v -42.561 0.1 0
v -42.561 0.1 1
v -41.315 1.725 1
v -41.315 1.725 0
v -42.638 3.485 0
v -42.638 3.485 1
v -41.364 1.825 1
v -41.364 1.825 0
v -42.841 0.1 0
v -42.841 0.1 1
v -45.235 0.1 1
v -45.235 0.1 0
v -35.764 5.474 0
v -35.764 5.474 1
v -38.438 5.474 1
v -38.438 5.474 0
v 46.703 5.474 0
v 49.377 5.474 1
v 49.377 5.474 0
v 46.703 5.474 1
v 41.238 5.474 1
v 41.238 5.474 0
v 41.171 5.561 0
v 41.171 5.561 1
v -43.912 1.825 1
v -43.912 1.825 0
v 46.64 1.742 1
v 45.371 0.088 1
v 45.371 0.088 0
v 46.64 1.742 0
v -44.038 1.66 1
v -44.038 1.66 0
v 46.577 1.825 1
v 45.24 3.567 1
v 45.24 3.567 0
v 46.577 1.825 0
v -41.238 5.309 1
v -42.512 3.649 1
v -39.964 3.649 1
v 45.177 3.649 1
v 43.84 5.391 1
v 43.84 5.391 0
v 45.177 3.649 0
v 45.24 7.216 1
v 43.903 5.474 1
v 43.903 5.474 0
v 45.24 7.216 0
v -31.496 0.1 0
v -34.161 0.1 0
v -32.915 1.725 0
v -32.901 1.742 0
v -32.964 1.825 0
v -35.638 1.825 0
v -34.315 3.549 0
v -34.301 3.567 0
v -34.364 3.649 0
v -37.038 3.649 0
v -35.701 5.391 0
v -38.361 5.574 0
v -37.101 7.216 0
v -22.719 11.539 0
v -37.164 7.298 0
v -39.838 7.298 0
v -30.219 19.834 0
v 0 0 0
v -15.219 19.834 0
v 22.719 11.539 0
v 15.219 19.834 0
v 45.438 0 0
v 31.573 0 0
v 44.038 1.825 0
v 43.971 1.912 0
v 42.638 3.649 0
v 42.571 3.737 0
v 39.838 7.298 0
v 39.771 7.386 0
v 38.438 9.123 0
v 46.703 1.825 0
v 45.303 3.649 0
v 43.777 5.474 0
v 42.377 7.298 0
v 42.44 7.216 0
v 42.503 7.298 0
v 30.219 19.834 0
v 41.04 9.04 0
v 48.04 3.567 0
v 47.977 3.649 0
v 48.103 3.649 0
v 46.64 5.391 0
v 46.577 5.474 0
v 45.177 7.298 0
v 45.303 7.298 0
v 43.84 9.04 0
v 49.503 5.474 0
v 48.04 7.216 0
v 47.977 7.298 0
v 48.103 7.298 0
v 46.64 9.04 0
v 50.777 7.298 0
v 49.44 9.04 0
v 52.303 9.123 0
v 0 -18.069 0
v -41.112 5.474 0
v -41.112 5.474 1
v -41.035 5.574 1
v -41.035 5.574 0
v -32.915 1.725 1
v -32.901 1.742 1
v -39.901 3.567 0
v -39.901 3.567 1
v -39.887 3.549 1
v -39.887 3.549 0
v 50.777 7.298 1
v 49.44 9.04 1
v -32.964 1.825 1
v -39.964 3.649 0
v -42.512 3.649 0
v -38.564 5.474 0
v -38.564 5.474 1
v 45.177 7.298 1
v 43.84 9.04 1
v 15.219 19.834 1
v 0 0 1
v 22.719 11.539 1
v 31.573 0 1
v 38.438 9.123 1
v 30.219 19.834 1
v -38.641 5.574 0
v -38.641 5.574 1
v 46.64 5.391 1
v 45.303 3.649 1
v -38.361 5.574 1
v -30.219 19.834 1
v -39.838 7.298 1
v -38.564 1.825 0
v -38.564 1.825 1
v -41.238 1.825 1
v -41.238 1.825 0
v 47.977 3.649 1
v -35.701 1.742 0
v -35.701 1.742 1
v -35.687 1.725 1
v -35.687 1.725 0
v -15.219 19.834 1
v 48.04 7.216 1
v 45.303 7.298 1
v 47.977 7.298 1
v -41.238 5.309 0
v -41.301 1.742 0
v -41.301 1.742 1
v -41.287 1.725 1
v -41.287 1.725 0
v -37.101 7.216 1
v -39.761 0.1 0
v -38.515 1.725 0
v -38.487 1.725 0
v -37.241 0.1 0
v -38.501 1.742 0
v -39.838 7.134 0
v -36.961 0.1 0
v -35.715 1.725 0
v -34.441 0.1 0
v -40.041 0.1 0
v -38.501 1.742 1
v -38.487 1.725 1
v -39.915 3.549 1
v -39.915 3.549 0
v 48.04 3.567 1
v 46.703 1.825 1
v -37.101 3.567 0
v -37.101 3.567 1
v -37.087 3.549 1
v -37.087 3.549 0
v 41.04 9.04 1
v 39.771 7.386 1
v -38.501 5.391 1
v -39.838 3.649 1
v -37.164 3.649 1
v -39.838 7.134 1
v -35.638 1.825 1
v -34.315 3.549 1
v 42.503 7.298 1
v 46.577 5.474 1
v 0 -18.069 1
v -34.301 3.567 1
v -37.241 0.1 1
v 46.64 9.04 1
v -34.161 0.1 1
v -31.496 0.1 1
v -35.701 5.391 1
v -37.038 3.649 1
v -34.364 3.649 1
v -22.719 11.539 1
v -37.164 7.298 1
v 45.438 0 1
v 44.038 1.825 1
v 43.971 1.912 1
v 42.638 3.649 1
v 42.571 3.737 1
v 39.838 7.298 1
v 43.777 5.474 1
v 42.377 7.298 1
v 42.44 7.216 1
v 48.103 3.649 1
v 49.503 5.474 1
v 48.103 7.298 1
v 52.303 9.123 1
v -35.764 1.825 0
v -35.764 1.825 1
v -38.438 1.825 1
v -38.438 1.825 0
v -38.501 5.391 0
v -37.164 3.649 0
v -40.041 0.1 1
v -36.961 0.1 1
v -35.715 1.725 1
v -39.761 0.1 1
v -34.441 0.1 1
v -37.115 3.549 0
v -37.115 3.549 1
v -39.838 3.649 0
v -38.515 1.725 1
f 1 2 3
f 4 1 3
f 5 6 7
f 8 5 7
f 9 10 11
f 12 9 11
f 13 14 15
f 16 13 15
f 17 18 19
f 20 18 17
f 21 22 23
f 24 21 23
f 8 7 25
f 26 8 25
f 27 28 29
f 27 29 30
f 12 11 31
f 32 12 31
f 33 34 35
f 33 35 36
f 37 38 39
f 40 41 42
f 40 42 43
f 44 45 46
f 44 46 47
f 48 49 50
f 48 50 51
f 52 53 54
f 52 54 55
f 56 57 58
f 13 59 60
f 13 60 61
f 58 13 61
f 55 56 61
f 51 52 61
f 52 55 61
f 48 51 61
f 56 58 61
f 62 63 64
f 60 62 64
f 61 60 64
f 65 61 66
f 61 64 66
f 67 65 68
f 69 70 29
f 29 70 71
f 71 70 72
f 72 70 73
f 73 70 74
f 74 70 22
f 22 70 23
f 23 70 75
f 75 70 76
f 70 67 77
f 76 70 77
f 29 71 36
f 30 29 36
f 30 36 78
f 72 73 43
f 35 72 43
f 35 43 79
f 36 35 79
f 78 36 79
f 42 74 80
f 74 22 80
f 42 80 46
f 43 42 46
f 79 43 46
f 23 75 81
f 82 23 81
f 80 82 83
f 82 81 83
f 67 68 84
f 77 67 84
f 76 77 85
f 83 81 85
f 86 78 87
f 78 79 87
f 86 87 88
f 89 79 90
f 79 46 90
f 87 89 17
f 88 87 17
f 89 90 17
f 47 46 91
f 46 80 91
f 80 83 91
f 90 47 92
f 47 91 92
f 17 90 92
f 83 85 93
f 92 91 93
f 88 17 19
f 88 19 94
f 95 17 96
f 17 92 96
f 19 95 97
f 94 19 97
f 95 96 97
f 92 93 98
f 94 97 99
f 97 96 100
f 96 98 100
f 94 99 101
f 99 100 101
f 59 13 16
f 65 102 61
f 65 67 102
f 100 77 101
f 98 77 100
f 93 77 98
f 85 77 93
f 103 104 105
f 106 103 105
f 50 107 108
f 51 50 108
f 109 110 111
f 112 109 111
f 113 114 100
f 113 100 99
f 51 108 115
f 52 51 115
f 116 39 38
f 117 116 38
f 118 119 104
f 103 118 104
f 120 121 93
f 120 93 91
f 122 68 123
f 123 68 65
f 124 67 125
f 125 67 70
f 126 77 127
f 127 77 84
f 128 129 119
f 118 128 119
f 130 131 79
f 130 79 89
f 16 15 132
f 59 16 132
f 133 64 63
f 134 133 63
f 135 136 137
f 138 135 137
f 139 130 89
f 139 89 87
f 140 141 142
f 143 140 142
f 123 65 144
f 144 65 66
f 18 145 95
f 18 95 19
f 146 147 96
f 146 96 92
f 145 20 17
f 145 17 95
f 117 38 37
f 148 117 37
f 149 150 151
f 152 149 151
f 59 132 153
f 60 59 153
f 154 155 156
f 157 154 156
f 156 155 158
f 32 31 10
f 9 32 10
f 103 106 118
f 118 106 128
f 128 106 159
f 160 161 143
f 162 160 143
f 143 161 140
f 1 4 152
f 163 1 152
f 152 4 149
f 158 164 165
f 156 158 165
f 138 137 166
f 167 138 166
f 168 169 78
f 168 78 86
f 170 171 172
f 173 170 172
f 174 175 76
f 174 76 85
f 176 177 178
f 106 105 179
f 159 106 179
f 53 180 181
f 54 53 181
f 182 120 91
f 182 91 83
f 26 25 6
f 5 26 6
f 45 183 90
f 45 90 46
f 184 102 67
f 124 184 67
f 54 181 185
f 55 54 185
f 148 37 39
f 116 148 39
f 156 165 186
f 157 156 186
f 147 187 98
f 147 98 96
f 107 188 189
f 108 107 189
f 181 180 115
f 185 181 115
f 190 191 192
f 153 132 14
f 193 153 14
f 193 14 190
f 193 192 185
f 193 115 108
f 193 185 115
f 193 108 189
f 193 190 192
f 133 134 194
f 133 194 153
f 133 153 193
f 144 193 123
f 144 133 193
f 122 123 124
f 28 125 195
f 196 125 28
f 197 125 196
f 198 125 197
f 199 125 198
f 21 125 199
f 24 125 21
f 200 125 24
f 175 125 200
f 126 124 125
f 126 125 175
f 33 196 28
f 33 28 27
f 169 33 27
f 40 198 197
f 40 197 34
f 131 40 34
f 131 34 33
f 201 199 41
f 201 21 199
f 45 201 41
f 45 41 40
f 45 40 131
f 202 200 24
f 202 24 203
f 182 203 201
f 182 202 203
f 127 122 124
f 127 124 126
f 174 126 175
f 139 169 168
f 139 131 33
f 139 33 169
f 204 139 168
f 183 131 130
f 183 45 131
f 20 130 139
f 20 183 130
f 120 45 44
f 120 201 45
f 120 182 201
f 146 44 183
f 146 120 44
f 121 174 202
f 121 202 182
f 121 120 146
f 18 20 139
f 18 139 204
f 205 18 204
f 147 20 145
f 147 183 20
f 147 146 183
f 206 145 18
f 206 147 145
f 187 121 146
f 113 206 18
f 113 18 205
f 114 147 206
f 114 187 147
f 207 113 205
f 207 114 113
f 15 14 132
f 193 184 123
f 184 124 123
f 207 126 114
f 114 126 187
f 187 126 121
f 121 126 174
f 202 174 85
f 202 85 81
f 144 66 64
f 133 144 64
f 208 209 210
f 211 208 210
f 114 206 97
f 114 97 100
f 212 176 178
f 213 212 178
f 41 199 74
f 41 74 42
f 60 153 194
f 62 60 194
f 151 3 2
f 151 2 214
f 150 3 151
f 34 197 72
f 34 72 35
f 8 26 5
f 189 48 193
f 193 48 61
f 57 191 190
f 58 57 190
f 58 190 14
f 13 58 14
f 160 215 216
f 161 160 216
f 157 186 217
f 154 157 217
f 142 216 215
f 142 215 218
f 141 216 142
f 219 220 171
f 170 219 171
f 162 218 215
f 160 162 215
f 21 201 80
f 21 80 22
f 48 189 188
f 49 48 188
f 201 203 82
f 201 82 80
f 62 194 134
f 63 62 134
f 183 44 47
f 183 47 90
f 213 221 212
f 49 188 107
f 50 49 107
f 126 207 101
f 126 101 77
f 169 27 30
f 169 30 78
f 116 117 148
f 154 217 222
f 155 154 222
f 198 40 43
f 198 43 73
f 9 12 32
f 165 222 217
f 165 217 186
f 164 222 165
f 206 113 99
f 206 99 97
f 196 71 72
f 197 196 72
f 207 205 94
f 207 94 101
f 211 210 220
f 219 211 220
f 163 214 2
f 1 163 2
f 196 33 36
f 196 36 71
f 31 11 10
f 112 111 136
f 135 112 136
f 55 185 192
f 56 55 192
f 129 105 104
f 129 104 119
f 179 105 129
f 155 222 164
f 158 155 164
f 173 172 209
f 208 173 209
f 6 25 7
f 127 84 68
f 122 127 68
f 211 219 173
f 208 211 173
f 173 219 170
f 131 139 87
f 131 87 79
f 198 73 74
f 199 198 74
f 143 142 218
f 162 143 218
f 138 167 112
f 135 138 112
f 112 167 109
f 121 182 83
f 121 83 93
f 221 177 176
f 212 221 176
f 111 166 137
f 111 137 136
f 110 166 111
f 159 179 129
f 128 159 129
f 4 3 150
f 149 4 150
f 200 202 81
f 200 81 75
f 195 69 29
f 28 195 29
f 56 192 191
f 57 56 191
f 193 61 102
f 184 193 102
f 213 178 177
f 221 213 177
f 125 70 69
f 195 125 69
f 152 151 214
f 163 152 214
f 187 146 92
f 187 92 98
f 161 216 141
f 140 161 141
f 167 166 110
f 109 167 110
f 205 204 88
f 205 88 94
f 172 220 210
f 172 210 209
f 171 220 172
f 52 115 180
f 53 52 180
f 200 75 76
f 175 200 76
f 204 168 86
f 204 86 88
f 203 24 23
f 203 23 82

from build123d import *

# Parameters (mm, degrees)
F1_DEPTH = 1
F3_DEPTH = 25
F4_DEPTH = 1
F5_DEPTH = 25


with BuildPart() as f1:
    # F0 (on Top) → F1 (new body)
    with BuildSketch(Plane.XY):
        Polygon((15.2190357252, 19.8338335073), (0, 0), (-15.2190357252, 19.8338335073), (-30.2190357252, 19.8338335073), (-45.4380714504, 0), (-31.5728748963, 0), (-22.7190357252, 11.5385478548), (0, -18.0694759488), (22.7190357252, 11.5385478548), (31.5728748963, 0), (45.4380714504, 0), (30.2190357252, 19.8338335073), align=None)
    extrude(amount=F1_DEPTH)

    # F2 (on face) → F3 (cut)
    with BuildSketch(Plane.XY.offset(1)):
        Polygon((-38.5148041492, 1.724515522), (-41.1613387516, 1.724515522), (-39.9148041492, 0.1), (-39.7613387516, 0.1), align=None)
        Polygon((-41.112024209, 5.4735465659), (-41.1750478297, 5.3914125843), (-39.8380714504, 3.649031044), (-38.5010950711, 5.3914125843), (-38.5641186918, 5.4735465659), align=None)
        Polygon((-39.712024209, 7.2980620879), (-39.7750478297, 7.2159281063), (-38.5148041492, 5.5735465659), (-38.4380714504, 5.5735465659), (-38.3613387516, 5.5735465659), (-37.1010950711, 7.2159281063), (-37.1641186918, 7.2980620879), align=None)
        Polygon((-35.7641186918, 5.4735465659), (-38.4380714504, 5.4735465659), (-37.0380714504, 3.649031044), (-35.7010950711, 5.3914125843), align=None)
        Polygon((-41.3148041492, 1.724515522), (-43.9613387516, 1.724515522), (-42.7148041492, 0.1), (-42.5613387516, 0.1), align=None)
        Polygon((-39.9148041492, 3.549031044), (-42.5613387516, 3.549031044), (-41.2380714504, 1.824515522), align=None)
        Polygon((-37.1148041492, 3.549031044), (-39.7613387516, 3.549031044), (-38.4380714504, 1.824515522), align=None)
        Polygon((-35.7148041492, 1.724515522), (-38.3613387516, 1.724515522), (-37.1148041492, 0.1), (-36.9613387516, 0.1), align=None)
        Polygon((-34.3148041492, 3.549031044), (-36.9613387516, 3.549031044), (-35.6380714504, 1.824515522), align=None)
        Polygon((-34.1613387516, 0.1), (-32.9148041492, 1.724515522), (-35.5613387516, 1.724515522), (-34.3148041492, 0.1), align=None)
    extrude(amount=-F3_DEPTH, mode=Mode.SUBTRACT)

    # F2 (on face) → F4 (join)
    with BuildSketch(Plane.XY.offset(1)):
        Polygon((46.5772207631, 1.824515522), (44.0380714504, 1.824515522), (45.3706697275, 0.0878396355), (46.6402443838, 1.7423815404), align=None)
        Polygon((45.1772207631, 3.649031044), (42.6380714504, 3.649031044), (43.9706697275, 1.9123551575), (45.2402443838, 3.5668970624), align=None)
        Polygon((43.7772207631, 5.4735465659), (41.2380714504, 5.4735465659), (42.5706697275, 3.7368706795), (43.8402443838, 5.3914125843), align=None)
        Polygon((42.3772207631, 7.2980620879), (39.8380714504, 7.2980620879), (41.1706697275, 5.5613862014), (42.4402443838, 7.2159281063), align=None)
        Polygon((41.1032680045, 9.1225776099), (38.4380714504, 9.1225776099), (39.7706697275, 7.3859017234), (41.0402443838, 9.0404436283), align=None)
        Polygon((43.9032680045, 9.1225776099), (41.1032680045, 9.1225776099), (42.5032680045, 7.2980620879), (43.8402443838, 9.0404436283), align=None)
        Polygon((45.1772207631, 7.2980620879), (42.5032680045, 7.2980620879), (43.9032680045, 5.4735465659), (45.2402443838, 7.2159281063), align=None)
        Polygon((46.7032680045, 9.1225776099), (43.9032680045, 9.1225776099), (45.3032680045, 7.2980620879), (46.6402443838, 9.0404436283), align=None)
        Polygon((49.5032680045, 9.1225776099), (46.7032680045, 9.1225776099), (48.1032680045, 7.2980620879), (49.4402443838, 9.0404436283), align=None)
        Polygon((52.3032680045, 9.1225776099), (49.5032680045, 9.1225776099), (50.9032680045, 7.2980620879), align=None)
        Polygon((50.7772207631, 7.2980620879), (48.1032680045, 7.2980620879), (49.5032680045, 5.4735465659), (50.9032680045, 7.2980620879), align=None)
        Polygon((49.3772207631, 5.4735465659), (46.7032680045, 5.4735465659), (48.1032680045, 3.649031044), (49.5032680045, 5.4735465659), align=None)
        Polygon((47.9772207631, 7.2980620879), (45.3032680045, 7.2980620879), (46.7032680045, 5.4735465659), (48.0402443838, 7.2159281063), align=None)
        Polygon((46.5772207631, 5.4735465659), (43.9032680045, 5.4735465659), (45.3032680045, 3.649031044), (46.6402443838, 5.3914125843), align=None)
        Polygon((47.9772207631, 3.649031044), (45.3032680045, 3.649031044), (46.7032680045, 1.824515522), (48.0402443838, 3.5668970624), align=None)
        Polygon((46.7032680045, 1.824515522), (45.3032680045, 3.649031044), (45.2402443838, 3.5668970624), (46.5772207631, 1.824515522), align=None)
        Polygon((45.2402443838, 3.5668970624), (45.3032680045, 3.649031044), (45.1772207631, 3.649031044), align=None)
        Polygon((45.3032680045, 3.649031044), (43.9032680045, 5.4735465659), (43.8402443838, 5.3914125843), (45.1772207631, 3.649031044), align=None)
        Polygon((46.6402443838, 1.7423815404), (46.7032680045, 1.824515522), (46.5772207631, 1.824515522), align=None)
        Polygon((43.9032680045, 5.4735465659), (42.5032680045, 7.2980620879), (42.4402443838, 7.2159281063), (43.7772207631, 5.4735465659), align=None)
        Polygon((43.8402443838, 5.3914125843), (43.9032680045, 5.4735465659), (43.7772207631, 5.4735465659), align=None)
        Polygon((48.1032680045, 3.649031044), (46.7032680045, 5.4735465659), (46.6402443838, 5.3914125843), (47.9772207631, 3.649031044), align=None)
        Polygon((46.7032680045, 5.4735465659), (46.5772207631, 5.4735465659), (46.6402443838, 5.3914125843), align=None)
        Polygon((46.7032680045, 5.4735465659), (45.3032680045, 7.2980620879), (45.2402443838, 7.2159281063), (46.5772207631, 5.4735465659), align=None)
        Polygon((48.1032680045, 3.649031044), (47.9772207631, 3.649031044), (48.0402443838, 3.5668970624), align=None)
        Polygon((49.5032680045, 5.4735465659), (48.1032680045, 7.2980620879), (48.0402443838, 7.2159281063), (49.3772207631, 5.4735465659), align=None)
        Polygon((42.5032680045, 7.2980620879), (41.1032680045, 9.1225776099), (41.0402443838, 9.0404436283), (42.3772207631, 7.2980620879), align=None)
        Polygon((42.4402443838, 7.2159281063), (42.5032680045, 7.2980620879), (42.3772207631, 7.2980620879), align=None)
        Polygon((45.3032680045, 7.2980620879), (43.9032680045, 9.1225776099), (43.8402443838, 9.0404436283), (45.1772207631, 7.2980620879), align=None)
        Polygon((45.3032680045, 7.2980620879), (45.1772207631, 7.2980620879), (45.2402443838, 7.2159281063), align=None)
        Polygon((48.1032680045, 7.2980620879), (46.7032680045, 9.1225776099), (46.6402443838, 9.0404436283), (47.9772207631, 7.2980620879), align=None)
        Polygon((48.1032680045, 7.2980620879), (47.9772207631, 7.2980620879), (48.0402443838, 7.2159281063), align=None)
        Polygon((50.9032680045, 7.2980620879), (49.5032680045, 9.1225776099), (49.4402443838, 9.0404436283), (50.7772207631, 7.2980620879), align=None)
    extrude(amount=-F4_DEPTH)

    # F2 (on face) → F5 (cut)
    with BuildSketch(Plane.XY.offset(1)):
        Polygon((-44.0380714504, 1.6602475588), (-44.1010950711, 1.7423815404), (-45.4380714504, 0), (-42.7641186918, 0), (-42.8408513906, 0.1), (-45.2352915102, 0.1), align=None)
        Polygon((-43.9750478297, 1.7423815404), (-44.0380714504, 1.824515522), (-44.1010950711, 1.7423815404), (-44.0380714504, 1.6602475588), (-43.9887569078, 1.724515522), align=None)
        Polygon((-43.912024209, 1.824515522), (-44.0380714504, 1.824515522), (-43.9750478297, 1.7423815404), align=None)
        Polygon((-42.6380714504, 3.4847630808), (-42.7010950711, 3.5668970624), (-44.0380714504, 1.824515522), (-43.912024209, 1.824515522), align=None)
        Polygon((-42.8408513906, 0.1), (-42.7641186918, 0), (-42.6380714504, 0), (-42.7148041492, 0.1), align=None)
        Polygon((-42.5613387516, 0.1), (-42.7148041492, 0.1), (-42.6380714504, 0), align=None)
        Polygon((-42.5613387516, 0.1), (-42.6380714504, 0), (-39.9641186918, 0), (-40.0408513906, 0.1), align=None)
        Polygon((-39.8380714504, 0), (-39.9148041492, 0.1), (-40.0408513906, 0.1), (-39.9641186918, 0), align=None)
        Polygon((-39.7613387516, 0.1), (-39.9148041492, 0.1), (-39.8380714504, 0), align=None)
        Polygon((-37.1641186918, 0), (-37.2408513906, 0.1), (-39.7613387516, 0.1), (-39.8380714504, 0), align=None)
        Polygon((-42.5750478297, 3.5668970624), (-42.6380714504, 3.649031044), (-42.7010950711, 3.5668970624), (-42.6380714504, 3.4847630808), (-42.5887569078, 3.549031044), align=None)
        Polygon((-42.512024209, 3.649031044), (-42.6380714504, 3.649031044), (-42.5750478297, 3.5668970624), align=None)
        Polygon((-41.2380714504, 5.3092786028), (-41.3010950711, 5.3914125843), (-42.6380714504, 3.649031044), (-42.512024209, 3.649031044), align=None)
        Polygon((-41.1750478297, 5.3914125843), (-41.2380714504, 5.4735465659), (-41.3010950711, 5.3914125843), (-41.2380714504, 5.3092786028), align=None)
        Polygon((-41.112024209, 5.4735465659), (-41.2380714504, 5.4735465659), (-41.1750478297, 5.3914125843), align=None)
        Polygon((-41.0352915102, 5.5735465659), (-41.1613387516, 5.5735465659), (-41.2380714504, 5.4735465659), (-41.112024209, 5.4735465659), align=None)
        Polygon((-39.8380714504, 7.1337941247), (-39.9010950711, 7.2159281063), (-41.1613387516, 5.5735465659), (-41.0352915102, 5.5735465659), align=None)
        Polygon((-39.7750478297, 7.2159281063), (-39.8380714504, 7.2980620879), (-39.9010950711, 7.2159281063), (-39.8380714504, 7.1337941247), align=None)
        Polygon((-39.712024209, 7.2980620879), (-39.8380714504, 7.2980620879), (-39.7750478297, 7.2159281063), align=None)
        Polygon((-37.0380714504, 0), (-37.1148041492, 0.1), (-37.2408513906, 0.1), (-37.1641186918, 0), align=None)
        Polygon((-36.9613387516, 0.1), (-37.1148041492, 0.1), (-37.0380714504, 0), align=None)
        Polygon((-34.3641186918, 0), (-34.4408513906, 0.1), (-36.9613387516, 0.1), (-37.0380714504, 0), align=None)
        Polygon((-34.2380714504, 0), (-34.3148041492, 0.1), (-34.4408513906, 0.1), (-34.3641186918, 0), align=None)
        Polygon((-34.2380714504, 0), (-34.1613387516, 0.1), (-34.3148041492, 0.1), align=None)
        Polygon((-31.5684967941, 0.0057056539), (-31.6408513906, 0.1), (-34.1613387516, 0.1), (-34.2380714504, 0), (-31.5728748963, 0), align=None)
        Polygon((-43.912024209, 1.824515522), (-43.9750478297, 1.7423815404), (-43.9613387516, 1.724515522), (-41.3148041492, 1.724515522), (-41.3010950711, 1.7423815404), (-41.3641186918, 1.824515522), align=None)
        Polygon((-41.2380714504, 1.824515522), (-41.3641186918, 1.824515522), (-41.3010950711, 1.7423815404), align=None)
        Polygon((-41.1613387516, 1.724515522), (-41.2380714504, 1.824515522), (-41.3010950711, 1.7423815404), (-41.287385993, 1.724515522), (-41.2380714504, 1.724515522), align=None)
        Polygon((-38.5641186918, 1.824515522), (-41.2380714504, 1.824515522), (-41.1613387516, 1.724515522), (-38.5148041492, 1.724515522), (-38.5010950711, 1.7423815404), align=None)
        Polygon((-38.5010950711, 1.7423815404), (-38.4380714504, 1.824515522), (-38.5641186918, 1.824515522), align=None)
        Polygon((-38.3613387516, 1.724515522), (-38.4380714504, 1.824515522), (-38.5010950711, 1.7423815404), (-38.487385993, 1.724515522), (-38.4380714504, 1.724515522), align=None)
        Polygon((-35.7641186918, 1.824515522), (-38.4380714504, 1.824515522), (-38.3613387516, 1.724515522), (-35.7148041492, 1.724515522), (-35.7010950711, 1.7423815404), align=None)
        Polygon((-35.7010950711, 1.7423815404), (-35.6380714504, 1.824515522), (-35.7641186918, 1.824515522), align=None)
        Polygon((-35.5613387516, 1.724515522), (-35.6380714504, 1.824515522), (-35.7010950711, 1.7423815404), (-35.687385993, 1.724515522), align=None)
        Polygon((-32.9010950711, 1.7423815404), (-32.9641186918, 1.824515522), (-35.6380714504, 1.824515522), (-35.5613387516, 1.724515522), (-32.9148041492, 1.724515522), align=None)
        Polygon((-42.512024209, 3.649031044), (-42.5750478297, 3.5668970624), (-42.5613387516, 3.549031044), (-39.9148041492, 3.549031044), (-39.9010950711, 3.5668970624), (-39.9641186918, 3.649031044), align=None)
        Polygon((-39.9010950711, 3.5668970624), (-39.8380714504, 3.649031044), (-39.9641186918, 3.649031044), align=None)
        Polygon((-39.7613387516, 3.549031044), (-39.8380714504, 3.649031044), (-39.9010950711, 3.5668970624), (-39.887385993, 3.549031044), (-39.8380714504, 3.549031044), align=None)
        Polygon((-37.1641186918, 3.649031044), (-39.8380714504, 3.649031044), (-39.7613387516, 3.549031044), (-37.1148041492, 3.549031044), (-37.1010950711, 3.5668970624), align=None)
        Polygon((-37.1010950711, 3.5668970624), (-37.0380714504, 3.649031044), (-37.1641186918, 3.649031044), align=None)
        Polygon((-36.9613387516, 3.549031044), (-37.0380714504, 3.649031044), (-37.1010950711, 3.5668970624), (-37.087385993, 3.549031044), align=None)
        Polygon((-34.3641186918, 3.649031044), (-37.0380714504, 3.649031044), (-36.9613387516, 3.549031044), (-34.3148041492, 3.549031044), (-34.3010950711, 3.5668970624), align=None)
        Polygon((-38.4380714504, 5.4735465659), (-38.5148041492, 5.5735465659), (-38.6408513906, 5.5735465659), (-38.5641186918, 5.4735465659), align=None)
        Polygon((-38.4380714504, 5.5735465659), (-38.5148041492, 5.5735465659), (-38.4380714504, 5.4735465659), (-38.3613387516, 5.5735465659), align=None)
        Polygon((-38.5010950711, 5.3914125843), (-38.4380714504, 5.4735465659), (-38.5641186918, 5.4735465659), align=None)
        Polygon((-37.0380714504, 3.649031044), (-38.4380714504, 5.4735465659), (-38.5010950711, 5.3914125843), (-37.1641186918, 3.649031044), align=None)
        Polygon((-38.4380714504, 1.824515522), (-39.7613387516, 3.549031044), (-39.8380714504, 3.549031044), (-39.887385993, 3.549031044), (-38.5641186918, 1.824515522), align=None)
        Polygon((-39.8380714504, 3.649031044), (-41.1750478297, 5.3914125843), (-41.2380714504, 5.3092786028), (-39.9641186918, 3.649031044), align=None)
        Polygon((-37.1148041492, 0.1), (-38.3613387516, 1.724515522), (-38.4380714504, 1.724515522), (-38.487385993, 1.724515522), (-37.2408513906, 0.1), align=None)
        Polygon((-34.3148041492, 0.1), (-35.5613387516, 1.724515522), (-35.687385993, 1.724515522), (-34.4408513906, 0.1), align=None)
        Polygon((-35.6380714504, 1.824515522), (-36.9613387516, 3.549031044), (-37.087385993, 3.549031044), (-35.7641186918, 1.824515522), align=None)
        Polygon((-38.5148041492, 5.5735465659), (-39.7750478297, 7.2159281063), (-39.8380714504, 7.1337941247), (-38.6408513906, 5.5735465659), align=None)
        Polygon((-42.5613387516, 3.549031044), (-42.5750478297, 3.5668970624), (-42.5887569078, 3.549031044), align=None)
        Polygon((-42.5887569078, 3.549031044), (-42.6380714504, 3.4847630808), (-41.3641186918, 1.824515522), (-41.2380714504, 1.824515522), (-42.5613387516, 3.549031044), align=None)
        Polygon((-43.9613387516, 1.724515522), (-43.9750478297, 1.7423815404), (-43.9887569078, 1.724515522), align=None)
        Polygon((-43.9887569078, 1.724515522), (-44.0380714504, 1.6602475588), (-42.8408513906, 0.1), (-42.7148041492, 0.1), (-43.9613387516, 1.724515522), align=None)
        Polygon((-39.9148041492, 0.1), (-41.1613387516, 1.724515522), (-41.2380714504, 1.724515522), (-41.287385993, 1.724515522), (-40.0408513906, 0.1), align=None)
        Polygon((-31.5054731734, 0.0878396355), (-31.5148041492, 0.1), (-31.6408513906, 0.1), (-31.5684967941, 0.0057056539), align=None)
        Polygon((-31.4961421975, 0.1), (-31.5148041492, 0.1), (-31.5054731734, 0.0878396355), align=None)
    extrude(amount=-F5_DEPTH, mode=Mode.SUBTRACT)


solid = f1.part
